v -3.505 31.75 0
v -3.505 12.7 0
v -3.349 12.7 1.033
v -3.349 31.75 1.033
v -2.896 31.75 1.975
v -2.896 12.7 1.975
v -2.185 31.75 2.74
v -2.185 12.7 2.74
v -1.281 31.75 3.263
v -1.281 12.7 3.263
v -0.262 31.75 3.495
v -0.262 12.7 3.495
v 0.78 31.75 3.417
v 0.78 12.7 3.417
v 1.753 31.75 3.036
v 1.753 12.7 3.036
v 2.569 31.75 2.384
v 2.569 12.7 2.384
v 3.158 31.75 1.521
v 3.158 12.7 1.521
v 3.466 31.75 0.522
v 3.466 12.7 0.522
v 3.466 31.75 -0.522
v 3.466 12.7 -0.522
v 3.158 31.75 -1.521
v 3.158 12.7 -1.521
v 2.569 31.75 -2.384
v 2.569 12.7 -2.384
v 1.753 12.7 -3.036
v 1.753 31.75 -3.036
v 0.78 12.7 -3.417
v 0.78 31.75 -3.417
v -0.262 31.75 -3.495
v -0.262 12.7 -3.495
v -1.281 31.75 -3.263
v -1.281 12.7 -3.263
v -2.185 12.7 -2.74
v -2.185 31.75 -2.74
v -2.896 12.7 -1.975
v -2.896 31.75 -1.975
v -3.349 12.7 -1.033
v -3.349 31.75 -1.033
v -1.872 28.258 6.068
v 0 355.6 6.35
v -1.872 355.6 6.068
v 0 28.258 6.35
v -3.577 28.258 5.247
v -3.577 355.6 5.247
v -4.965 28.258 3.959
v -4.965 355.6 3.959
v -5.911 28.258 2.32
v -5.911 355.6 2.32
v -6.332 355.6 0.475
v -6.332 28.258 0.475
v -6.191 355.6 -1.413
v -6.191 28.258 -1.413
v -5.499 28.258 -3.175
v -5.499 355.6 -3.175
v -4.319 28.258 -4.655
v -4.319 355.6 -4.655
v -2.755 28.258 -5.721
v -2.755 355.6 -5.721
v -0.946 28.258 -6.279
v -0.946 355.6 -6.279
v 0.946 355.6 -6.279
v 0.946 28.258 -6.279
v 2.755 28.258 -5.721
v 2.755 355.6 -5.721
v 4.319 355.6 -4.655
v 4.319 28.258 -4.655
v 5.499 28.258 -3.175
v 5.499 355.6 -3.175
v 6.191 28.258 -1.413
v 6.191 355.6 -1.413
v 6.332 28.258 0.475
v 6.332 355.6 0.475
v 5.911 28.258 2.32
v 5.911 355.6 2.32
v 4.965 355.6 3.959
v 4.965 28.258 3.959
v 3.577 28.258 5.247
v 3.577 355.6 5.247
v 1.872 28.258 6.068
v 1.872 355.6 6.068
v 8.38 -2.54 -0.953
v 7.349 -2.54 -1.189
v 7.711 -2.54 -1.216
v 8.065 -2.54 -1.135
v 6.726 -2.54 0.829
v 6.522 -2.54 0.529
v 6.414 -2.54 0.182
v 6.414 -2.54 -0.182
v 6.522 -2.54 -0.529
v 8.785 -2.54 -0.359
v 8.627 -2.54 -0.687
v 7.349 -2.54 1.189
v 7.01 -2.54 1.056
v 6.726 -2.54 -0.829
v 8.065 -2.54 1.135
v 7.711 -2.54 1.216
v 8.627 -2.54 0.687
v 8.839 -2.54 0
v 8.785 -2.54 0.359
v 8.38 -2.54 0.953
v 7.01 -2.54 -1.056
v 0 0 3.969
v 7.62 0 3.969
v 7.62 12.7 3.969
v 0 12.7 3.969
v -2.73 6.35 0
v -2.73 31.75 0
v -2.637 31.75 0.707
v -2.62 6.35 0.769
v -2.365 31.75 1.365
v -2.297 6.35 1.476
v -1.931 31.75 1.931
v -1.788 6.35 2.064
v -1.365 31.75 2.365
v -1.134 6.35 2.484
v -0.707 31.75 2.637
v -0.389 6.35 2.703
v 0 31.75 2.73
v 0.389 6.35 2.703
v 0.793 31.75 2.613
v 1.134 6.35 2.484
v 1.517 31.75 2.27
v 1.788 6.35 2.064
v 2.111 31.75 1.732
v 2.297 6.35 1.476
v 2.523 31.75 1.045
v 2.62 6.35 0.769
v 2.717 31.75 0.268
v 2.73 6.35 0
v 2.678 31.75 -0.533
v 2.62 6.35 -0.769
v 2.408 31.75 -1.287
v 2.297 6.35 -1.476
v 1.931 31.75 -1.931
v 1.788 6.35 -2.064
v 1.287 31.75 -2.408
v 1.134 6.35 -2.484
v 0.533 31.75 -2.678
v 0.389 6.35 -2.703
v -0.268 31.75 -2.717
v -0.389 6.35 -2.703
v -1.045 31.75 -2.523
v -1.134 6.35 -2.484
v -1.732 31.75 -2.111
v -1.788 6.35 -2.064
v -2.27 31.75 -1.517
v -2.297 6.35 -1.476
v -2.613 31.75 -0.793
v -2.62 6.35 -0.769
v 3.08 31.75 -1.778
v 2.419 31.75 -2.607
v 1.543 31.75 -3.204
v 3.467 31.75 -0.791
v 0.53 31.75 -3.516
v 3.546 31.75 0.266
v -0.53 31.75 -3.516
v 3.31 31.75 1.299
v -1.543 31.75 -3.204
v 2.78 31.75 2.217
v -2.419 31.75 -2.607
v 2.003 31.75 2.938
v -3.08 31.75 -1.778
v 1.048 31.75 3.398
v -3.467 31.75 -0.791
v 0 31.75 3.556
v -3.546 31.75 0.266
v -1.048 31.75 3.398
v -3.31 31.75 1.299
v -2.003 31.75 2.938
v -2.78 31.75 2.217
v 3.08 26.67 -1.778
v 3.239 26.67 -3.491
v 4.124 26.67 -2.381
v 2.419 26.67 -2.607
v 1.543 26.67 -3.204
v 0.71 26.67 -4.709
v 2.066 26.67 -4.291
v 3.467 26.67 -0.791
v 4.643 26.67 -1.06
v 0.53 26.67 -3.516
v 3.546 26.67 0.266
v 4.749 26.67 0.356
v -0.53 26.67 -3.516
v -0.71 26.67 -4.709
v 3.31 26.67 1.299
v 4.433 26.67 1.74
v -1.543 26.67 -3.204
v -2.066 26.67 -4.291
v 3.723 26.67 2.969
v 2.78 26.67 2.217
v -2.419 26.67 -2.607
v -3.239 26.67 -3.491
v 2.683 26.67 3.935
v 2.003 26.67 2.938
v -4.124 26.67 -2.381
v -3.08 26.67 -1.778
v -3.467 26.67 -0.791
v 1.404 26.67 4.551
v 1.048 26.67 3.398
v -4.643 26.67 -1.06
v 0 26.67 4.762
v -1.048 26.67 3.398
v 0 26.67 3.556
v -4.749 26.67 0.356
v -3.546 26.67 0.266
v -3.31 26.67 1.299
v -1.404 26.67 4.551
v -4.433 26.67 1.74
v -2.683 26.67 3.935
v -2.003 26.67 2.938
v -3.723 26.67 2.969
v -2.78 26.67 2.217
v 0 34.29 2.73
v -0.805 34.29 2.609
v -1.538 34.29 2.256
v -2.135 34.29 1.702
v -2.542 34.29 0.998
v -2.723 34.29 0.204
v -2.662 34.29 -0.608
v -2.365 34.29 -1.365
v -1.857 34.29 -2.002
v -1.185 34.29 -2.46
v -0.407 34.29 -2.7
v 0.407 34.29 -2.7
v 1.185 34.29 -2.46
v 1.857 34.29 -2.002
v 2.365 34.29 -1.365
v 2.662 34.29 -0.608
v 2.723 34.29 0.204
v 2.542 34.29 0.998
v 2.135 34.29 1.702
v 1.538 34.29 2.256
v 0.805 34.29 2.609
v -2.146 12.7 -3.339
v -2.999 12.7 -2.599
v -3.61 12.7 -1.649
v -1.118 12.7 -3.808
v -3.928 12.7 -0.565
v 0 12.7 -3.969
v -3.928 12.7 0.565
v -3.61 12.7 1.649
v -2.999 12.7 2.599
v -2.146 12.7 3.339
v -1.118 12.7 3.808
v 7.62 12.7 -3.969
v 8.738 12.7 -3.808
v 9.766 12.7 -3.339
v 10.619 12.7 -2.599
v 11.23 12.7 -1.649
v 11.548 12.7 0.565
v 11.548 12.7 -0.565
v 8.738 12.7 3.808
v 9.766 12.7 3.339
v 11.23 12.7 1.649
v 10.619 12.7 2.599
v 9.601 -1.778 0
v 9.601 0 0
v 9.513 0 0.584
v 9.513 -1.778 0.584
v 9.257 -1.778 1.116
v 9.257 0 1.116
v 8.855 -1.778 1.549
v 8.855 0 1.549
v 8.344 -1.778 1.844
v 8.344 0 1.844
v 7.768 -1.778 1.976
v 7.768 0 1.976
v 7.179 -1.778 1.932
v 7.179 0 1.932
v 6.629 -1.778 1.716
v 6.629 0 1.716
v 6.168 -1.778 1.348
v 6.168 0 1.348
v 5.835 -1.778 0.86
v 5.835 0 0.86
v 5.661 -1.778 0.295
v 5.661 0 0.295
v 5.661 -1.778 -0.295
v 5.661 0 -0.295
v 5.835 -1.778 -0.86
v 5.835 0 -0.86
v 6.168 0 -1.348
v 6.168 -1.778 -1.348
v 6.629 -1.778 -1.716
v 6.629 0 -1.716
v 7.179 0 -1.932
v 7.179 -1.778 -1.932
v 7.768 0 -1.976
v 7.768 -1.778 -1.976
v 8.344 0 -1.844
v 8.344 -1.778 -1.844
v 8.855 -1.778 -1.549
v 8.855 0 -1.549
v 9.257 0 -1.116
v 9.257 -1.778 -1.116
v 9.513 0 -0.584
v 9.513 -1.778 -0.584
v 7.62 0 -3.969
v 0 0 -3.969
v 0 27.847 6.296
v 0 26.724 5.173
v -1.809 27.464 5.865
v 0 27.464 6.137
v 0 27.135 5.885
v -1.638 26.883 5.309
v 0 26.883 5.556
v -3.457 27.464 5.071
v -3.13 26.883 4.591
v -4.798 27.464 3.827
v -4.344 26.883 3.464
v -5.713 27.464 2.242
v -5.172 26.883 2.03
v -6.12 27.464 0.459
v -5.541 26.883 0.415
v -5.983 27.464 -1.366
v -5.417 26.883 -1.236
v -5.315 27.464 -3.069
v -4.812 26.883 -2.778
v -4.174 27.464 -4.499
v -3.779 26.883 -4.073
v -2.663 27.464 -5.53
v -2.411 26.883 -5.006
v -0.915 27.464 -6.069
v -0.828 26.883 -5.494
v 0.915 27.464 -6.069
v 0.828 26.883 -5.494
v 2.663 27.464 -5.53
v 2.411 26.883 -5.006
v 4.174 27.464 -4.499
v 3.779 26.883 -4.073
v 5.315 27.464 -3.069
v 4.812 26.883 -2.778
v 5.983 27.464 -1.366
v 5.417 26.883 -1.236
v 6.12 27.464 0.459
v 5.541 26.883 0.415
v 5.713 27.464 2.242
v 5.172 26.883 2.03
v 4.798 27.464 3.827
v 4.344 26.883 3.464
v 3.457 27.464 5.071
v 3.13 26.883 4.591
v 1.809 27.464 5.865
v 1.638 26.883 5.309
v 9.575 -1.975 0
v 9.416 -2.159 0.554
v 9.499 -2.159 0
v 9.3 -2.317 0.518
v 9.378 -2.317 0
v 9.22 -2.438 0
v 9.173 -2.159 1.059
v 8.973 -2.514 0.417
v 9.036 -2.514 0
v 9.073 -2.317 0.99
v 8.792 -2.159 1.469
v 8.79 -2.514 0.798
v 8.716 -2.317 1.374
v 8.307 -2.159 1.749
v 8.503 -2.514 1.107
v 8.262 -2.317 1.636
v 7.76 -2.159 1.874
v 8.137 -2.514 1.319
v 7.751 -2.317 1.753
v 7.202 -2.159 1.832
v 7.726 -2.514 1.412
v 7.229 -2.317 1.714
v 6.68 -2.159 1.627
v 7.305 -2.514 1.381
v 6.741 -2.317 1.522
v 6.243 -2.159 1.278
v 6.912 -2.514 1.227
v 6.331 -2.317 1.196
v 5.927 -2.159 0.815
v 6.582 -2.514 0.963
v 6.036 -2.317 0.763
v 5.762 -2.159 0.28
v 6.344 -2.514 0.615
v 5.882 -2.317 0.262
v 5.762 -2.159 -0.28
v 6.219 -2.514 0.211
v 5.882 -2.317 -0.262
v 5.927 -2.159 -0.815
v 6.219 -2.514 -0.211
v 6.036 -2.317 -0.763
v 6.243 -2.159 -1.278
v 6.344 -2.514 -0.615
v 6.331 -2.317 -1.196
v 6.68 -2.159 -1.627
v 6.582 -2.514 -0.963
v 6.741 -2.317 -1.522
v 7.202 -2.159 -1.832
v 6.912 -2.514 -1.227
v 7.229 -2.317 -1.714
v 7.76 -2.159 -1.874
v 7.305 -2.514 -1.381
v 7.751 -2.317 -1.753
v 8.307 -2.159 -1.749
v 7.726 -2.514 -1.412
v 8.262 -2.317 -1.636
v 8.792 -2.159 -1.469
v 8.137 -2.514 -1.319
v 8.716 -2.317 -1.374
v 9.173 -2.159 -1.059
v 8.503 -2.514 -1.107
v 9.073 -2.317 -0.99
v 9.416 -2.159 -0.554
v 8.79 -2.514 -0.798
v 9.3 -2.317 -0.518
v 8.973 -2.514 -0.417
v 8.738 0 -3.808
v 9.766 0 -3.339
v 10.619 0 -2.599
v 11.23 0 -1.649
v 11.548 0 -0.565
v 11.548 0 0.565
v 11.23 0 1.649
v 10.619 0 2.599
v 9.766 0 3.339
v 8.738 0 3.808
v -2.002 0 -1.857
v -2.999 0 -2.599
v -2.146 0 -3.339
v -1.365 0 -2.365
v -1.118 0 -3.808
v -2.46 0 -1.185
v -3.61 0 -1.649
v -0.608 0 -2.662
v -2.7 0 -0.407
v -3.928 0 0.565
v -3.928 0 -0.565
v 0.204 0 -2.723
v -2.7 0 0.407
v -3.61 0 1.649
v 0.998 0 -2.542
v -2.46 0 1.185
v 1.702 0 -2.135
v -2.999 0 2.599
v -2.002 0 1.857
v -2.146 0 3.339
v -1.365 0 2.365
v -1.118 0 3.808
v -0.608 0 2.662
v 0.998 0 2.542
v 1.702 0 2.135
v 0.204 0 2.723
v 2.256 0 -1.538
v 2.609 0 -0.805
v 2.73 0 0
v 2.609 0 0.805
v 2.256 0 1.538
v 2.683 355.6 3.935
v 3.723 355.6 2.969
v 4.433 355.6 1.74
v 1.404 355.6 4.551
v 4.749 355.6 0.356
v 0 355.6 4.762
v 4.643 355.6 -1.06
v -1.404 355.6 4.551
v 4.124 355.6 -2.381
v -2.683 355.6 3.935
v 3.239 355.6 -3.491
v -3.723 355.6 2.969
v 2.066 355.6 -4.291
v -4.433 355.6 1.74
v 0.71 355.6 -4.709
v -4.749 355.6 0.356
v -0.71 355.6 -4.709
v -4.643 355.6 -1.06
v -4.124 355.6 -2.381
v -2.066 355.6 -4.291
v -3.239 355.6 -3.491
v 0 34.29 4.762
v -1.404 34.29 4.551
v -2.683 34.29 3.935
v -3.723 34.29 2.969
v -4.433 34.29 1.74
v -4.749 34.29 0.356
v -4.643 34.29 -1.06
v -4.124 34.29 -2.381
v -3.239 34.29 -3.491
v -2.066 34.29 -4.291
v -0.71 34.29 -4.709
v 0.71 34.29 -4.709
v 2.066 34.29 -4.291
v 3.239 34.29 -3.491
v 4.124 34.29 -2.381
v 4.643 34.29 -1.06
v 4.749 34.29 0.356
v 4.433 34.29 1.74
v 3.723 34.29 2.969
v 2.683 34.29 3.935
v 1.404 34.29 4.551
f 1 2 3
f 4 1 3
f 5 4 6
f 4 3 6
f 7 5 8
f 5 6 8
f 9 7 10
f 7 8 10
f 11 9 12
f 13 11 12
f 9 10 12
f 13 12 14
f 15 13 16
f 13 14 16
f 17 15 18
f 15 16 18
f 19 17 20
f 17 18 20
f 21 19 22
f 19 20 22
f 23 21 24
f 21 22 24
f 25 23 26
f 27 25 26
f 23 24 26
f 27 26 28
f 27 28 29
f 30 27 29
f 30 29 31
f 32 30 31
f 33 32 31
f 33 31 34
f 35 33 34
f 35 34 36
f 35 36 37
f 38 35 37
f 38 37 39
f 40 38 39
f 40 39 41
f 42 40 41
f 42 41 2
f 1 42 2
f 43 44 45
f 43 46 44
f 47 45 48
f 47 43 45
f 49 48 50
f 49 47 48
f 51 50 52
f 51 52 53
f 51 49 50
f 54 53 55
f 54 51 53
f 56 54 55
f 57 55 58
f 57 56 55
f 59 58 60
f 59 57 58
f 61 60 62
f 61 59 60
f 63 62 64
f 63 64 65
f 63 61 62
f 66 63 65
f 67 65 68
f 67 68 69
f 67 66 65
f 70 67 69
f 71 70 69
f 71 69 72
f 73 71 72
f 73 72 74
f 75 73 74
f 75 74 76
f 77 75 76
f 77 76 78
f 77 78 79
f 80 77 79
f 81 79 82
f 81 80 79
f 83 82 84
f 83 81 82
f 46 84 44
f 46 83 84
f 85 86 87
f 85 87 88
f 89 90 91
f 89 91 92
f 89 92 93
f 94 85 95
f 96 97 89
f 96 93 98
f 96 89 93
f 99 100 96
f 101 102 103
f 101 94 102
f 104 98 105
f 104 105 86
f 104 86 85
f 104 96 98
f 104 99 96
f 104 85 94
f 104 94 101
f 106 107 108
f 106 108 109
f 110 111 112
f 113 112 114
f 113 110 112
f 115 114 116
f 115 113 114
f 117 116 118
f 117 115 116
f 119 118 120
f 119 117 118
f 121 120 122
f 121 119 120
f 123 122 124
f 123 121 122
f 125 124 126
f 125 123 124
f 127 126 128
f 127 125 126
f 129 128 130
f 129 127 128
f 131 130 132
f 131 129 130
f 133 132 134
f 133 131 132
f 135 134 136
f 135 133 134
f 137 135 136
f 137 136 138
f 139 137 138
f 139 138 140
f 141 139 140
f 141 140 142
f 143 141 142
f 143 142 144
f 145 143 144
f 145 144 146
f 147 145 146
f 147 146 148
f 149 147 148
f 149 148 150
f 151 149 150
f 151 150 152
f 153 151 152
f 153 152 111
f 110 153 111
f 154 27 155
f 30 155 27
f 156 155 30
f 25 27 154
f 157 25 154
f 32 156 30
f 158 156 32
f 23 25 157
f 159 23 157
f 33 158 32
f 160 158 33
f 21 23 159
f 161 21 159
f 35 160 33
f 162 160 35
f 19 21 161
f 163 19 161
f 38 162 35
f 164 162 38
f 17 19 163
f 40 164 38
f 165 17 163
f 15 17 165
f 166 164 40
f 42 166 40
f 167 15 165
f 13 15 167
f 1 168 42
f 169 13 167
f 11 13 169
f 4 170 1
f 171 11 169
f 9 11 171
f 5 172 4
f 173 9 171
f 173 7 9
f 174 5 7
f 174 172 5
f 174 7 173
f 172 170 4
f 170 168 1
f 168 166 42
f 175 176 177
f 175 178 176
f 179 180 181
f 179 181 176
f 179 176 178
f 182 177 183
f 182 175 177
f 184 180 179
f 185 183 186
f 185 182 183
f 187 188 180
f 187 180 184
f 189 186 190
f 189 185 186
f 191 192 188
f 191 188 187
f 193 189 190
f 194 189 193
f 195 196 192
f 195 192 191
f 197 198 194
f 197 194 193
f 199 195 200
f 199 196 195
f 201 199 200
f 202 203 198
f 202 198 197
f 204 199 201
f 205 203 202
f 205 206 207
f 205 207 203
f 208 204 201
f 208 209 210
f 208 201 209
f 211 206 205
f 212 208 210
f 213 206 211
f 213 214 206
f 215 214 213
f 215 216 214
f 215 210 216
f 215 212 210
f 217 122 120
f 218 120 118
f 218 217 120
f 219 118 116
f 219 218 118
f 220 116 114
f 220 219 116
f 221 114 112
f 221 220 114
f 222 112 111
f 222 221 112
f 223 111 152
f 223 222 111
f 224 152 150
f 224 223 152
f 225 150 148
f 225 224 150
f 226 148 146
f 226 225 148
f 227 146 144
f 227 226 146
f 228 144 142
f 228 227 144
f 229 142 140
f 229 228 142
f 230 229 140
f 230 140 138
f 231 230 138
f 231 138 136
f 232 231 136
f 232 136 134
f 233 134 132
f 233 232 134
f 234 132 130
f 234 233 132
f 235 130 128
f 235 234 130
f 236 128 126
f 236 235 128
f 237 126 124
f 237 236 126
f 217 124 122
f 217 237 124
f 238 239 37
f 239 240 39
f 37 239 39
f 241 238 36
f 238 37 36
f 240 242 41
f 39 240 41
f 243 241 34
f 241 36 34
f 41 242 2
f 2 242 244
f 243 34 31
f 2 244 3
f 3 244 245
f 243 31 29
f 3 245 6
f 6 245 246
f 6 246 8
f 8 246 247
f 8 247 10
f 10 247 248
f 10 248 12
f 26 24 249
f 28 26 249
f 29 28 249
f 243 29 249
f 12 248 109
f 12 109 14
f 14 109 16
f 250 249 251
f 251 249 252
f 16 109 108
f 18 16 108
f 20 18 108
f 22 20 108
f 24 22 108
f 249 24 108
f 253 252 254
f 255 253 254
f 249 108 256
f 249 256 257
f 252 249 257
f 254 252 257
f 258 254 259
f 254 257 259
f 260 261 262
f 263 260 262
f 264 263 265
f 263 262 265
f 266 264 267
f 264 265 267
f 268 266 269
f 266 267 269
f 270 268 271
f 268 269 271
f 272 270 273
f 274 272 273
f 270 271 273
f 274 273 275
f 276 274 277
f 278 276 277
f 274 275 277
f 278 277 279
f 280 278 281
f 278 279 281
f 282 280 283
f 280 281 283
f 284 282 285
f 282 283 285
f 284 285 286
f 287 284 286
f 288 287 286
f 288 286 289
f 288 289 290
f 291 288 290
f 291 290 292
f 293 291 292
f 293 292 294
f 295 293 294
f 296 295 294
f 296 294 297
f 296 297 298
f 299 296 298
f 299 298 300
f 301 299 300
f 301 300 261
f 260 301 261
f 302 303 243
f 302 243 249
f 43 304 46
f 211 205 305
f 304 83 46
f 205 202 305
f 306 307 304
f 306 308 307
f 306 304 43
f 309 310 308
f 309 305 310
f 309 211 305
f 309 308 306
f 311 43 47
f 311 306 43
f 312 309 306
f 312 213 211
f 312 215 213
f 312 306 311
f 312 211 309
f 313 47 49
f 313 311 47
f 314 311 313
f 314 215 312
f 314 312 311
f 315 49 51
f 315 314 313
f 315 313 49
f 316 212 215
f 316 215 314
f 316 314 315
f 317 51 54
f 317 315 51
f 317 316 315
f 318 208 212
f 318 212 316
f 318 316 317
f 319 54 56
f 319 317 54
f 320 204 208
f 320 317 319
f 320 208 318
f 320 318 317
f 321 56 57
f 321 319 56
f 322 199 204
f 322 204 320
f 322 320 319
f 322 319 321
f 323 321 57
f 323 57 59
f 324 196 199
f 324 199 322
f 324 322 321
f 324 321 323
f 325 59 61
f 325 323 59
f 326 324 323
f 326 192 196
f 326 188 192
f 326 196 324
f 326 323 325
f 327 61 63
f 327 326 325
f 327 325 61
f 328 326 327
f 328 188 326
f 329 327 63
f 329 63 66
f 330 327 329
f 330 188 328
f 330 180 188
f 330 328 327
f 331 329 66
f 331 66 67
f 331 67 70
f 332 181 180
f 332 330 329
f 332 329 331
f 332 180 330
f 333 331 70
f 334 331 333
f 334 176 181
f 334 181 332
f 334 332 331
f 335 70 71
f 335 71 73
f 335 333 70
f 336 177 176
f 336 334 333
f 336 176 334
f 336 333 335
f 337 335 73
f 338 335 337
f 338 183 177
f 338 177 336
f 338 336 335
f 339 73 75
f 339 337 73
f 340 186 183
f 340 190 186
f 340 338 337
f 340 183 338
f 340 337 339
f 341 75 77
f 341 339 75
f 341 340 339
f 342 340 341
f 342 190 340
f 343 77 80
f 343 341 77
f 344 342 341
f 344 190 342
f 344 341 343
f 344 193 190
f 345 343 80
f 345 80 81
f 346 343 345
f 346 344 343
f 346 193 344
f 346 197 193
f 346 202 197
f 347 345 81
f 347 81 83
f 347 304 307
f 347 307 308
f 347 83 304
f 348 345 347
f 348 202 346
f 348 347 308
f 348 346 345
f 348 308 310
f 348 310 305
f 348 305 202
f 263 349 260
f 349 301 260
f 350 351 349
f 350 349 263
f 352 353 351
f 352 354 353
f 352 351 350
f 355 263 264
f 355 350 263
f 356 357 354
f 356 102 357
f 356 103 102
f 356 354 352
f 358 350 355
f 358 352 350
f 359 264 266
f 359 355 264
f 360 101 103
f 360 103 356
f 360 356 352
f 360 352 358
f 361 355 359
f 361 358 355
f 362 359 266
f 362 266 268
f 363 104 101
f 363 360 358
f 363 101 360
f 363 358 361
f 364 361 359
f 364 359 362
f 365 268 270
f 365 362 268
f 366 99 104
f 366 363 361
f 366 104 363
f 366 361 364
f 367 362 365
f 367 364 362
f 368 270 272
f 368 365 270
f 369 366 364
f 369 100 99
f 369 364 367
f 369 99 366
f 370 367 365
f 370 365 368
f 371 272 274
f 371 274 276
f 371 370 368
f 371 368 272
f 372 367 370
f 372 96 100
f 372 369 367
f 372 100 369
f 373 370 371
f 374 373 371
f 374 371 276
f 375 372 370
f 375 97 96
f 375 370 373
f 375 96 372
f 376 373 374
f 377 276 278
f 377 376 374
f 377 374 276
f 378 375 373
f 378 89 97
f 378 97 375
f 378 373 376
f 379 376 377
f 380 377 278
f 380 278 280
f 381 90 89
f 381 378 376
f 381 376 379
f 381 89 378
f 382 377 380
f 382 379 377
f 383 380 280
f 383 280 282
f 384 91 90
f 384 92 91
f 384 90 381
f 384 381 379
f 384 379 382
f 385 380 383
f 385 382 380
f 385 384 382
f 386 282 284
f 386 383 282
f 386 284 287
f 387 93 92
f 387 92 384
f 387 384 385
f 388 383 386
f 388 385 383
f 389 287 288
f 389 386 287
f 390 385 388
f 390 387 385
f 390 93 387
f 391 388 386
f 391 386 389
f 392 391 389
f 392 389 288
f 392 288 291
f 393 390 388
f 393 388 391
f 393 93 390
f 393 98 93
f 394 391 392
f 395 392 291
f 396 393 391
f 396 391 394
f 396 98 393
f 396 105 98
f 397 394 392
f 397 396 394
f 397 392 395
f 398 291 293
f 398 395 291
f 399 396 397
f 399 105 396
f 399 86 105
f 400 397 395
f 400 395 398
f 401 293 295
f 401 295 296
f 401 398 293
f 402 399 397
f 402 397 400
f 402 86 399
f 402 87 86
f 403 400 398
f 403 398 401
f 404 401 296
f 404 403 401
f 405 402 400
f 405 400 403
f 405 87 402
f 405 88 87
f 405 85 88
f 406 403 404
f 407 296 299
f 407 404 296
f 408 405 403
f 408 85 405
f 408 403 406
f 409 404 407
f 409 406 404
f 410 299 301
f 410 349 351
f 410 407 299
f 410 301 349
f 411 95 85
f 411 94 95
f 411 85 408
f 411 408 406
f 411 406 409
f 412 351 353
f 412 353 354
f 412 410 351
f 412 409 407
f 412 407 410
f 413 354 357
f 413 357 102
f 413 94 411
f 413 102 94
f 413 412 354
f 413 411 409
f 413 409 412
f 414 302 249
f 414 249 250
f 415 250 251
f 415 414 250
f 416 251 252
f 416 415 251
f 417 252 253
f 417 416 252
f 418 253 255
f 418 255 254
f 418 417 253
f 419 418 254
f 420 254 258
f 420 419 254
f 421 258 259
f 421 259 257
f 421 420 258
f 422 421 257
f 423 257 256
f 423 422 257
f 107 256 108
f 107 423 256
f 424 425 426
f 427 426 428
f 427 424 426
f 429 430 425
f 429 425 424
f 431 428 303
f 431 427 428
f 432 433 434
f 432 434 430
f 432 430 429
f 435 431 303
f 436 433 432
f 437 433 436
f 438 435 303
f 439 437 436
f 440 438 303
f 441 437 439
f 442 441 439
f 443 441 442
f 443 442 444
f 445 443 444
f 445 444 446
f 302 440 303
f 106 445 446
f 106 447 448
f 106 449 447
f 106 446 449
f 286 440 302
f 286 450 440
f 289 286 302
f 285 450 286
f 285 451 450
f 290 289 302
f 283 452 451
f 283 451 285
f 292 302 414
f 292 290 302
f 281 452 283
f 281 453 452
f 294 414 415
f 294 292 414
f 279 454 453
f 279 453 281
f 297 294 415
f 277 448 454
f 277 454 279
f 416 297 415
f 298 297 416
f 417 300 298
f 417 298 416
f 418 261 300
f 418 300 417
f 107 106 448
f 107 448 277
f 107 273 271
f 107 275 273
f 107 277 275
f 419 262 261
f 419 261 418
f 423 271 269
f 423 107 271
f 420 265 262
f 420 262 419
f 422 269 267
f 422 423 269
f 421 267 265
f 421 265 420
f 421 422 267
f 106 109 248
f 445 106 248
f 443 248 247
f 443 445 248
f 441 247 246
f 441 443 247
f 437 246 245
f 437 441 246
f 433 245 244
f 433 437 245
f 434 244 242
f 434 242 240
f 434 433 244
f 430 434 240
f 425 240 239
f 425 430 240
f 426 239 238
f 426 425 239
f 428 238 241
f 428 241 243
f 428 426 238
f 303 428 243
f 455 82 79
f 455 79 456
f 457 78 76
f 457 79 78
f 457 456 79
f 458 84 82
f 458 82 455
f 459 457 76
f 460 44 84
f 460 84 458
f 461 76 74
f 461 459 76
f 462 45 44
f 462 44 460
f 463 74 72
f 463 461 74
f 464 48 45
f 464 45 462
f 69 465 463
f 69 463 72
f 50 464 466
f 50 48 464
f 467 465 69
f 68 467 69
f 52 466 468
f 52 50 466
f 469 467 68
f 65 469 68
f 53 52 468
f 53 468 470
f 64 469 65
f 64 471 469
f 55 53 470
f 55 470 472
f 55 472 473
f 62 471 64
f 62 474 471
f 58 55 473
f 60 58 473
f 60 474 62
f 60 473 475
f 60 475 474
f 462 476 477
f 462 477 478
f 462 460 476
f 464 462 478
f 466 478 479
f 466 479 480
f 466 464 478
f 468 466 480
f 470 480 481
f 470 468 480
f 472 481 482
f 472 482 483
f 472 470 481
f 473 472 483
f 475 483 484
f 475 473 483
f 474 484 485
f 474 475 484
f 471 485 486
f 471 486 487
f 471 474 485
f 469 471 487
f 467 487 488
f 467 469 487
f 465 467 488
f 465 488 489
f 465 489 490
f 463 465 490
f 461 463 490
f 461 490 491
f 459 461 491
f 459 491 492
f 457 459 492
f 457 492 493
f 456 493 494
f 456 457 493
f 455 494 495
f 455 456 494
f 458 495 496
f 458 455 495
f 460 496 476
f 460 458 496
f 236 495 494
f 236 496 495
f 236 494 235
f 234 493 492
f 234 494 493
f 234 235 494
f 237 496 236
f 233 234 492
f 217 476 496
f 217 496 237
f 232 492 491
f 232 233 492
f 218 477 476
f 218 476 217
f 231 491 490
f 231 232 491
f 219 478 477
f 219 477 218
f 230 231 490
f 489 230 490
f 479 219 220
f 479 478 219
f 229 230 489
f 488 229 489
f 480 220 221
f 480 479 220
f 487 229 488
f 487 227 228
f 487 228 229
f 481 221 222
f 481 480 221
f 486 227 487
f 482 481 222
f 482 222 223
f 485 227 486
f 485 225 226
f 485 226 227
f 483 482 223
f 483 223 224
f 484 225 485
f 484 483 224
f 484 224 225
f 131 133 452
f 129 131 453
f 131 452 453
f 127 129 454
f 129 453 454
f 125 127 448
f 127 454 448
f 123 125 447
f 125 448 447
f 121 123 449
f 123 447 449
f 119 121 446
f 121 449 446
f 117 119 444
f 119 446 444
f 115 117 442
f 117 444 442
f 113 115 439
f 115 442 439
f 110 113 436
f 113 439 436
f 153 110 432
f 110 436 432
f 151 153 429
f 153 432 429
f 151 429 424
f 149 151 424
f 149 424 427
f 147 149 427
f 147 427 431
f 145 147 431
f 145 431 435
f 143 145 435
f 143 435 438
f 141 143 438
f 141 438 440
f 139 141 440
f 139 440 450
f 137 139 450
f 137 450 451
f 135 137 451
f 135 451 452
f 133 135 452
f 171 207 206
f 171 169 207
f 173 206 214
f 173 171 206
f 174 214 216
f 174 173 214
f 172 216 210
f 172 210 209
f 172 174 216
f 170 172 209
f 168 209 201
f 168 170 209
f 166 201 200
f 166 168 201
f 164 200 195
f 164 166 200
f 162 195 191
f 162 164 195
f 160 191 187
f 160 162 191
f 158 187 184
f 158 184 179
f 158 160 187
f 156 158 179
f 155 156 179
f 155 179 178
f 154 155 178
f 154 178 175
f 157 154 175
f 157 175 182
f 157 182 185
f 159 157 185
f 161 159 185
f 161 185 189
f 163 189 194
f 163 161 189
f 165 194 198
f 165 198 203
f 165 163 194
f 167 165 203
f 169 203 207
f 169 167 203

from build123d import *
from build123d import SkipClean  # not in build123d's __all__

# Parameters (mm, degrees)
F0_R     = 2.7305
F1_DEPTH = 12.7
F2_R     = 3.5052
F3_DEPTH = 6.35
F4_R     = 1.9812
F5_DEPTH = 7.62
F6_R     = 3.5052
F6_R_2   = 2.7305
F7_DEPTH = 25.4
F8_R     = 1.9812
F9_DEPTH = 10.16
F10_R    = 0.762


# Not quite as in the source:
# - after a boolean that leaves OpenCascade's solid faulty, fix() repairs it


with BuildPart() as f1:
    # F0 (on Front) → F1 (new body)
    with BuildSketch(Plane.XZ):
        with BuildLine():
            Line((7.62, 3.96875), (0, 3.96875))
            ThreePointArc((0, 3.96875), (-3.96875, 0), (0, -3.96875))
            Line((0, -3.96875), (7.62, -3.96875))
            ThreePointArc((7.62, -3.96875), (11.58875, 0), (7.62, 3.96875))
        make_face()
        Circle(F0_R, mode=Mode.SUBTRACT)
    extrude(amount=-F1_DEPTH)

    # F2 (on face) → F3 (cut)
    with BuildSketch(Plane(origin=(0, 12.7, 0), x_dir=(-1, 0, 0), z_dir=(0, 1, 0))):
        Circle(F2_R)
    extrude(amount=-F3_DEPTH, mode=Mode.SUBTRACT)

    # F4 (on face) → F5 (cut)
    with BuildSketch(Plane.XZ):
        with Locations((7.62, 0)):
            Circle(F4_R)
    extrude(amount=-F5_DEPTH, mode=Mode.SUBTRACT)

    # F6 (on face) → F7 (join)
    with BuildSketch(Plane(origin=(0, 6.35, 0), x_dir=(-1, 0, 0), z_dir=(0, 1, 0))):
        Circle(F6_R)
        Circle(F6_R_2, mode=Mode.SUBTRACT)
    with SkipClean():  # cleaning this boolean's faces spoils the solid; the shape is the same uncleaned
        extrude(amount=F7_DEPTH)

    # F8 (on face) → F9 (join)
    with BuildSketch(Plane.XZ.offset(-7.62)):
        with Locations((7.62, 0)):
            Circle(F8_R)
    extrude(amount=F9_DEPTH)

    add(f1.part.fix(), mode=Mode.REPLACE)

    # F10
    f10_edges = [f1.edges().sort_by_distance(p)[0] for p in [
        (5.6388, -2.54, 0),
    ]]
    fillet(f10_edges, radius=F10_R)

    # F11 (on Right) → F12 (revolve)
    with BuildSketch(Plane.YZ):
        with BuildLine():
            Line((26.67, 4.7625), (26.67, 3.556))
            Line((26.67, 3.556), (31.75, 3.556))
            Line((31.75, 3.556), (31.75, 2.7305))
            Line((31.75, 2.7305), (34.29, 2.7305))
            Line((34.29, 2.7305), (34.29, 4.7625))
            Line((34.29, 4.7625), (355.6, 4.7625))
            Line((355.6, 4.7625), (355.6, 6.35))
            Line((355.6, 6.35), (28.2575, 6.35))
            ThreePointArc((28.2575, 6.35), (27.1349679849, 5.8850320151), (26.67, 4.7625))
        make_face()
    revolve(axis=Axis((0, 6.35, 0), (0, -1, 0)))


solid = f1.part
